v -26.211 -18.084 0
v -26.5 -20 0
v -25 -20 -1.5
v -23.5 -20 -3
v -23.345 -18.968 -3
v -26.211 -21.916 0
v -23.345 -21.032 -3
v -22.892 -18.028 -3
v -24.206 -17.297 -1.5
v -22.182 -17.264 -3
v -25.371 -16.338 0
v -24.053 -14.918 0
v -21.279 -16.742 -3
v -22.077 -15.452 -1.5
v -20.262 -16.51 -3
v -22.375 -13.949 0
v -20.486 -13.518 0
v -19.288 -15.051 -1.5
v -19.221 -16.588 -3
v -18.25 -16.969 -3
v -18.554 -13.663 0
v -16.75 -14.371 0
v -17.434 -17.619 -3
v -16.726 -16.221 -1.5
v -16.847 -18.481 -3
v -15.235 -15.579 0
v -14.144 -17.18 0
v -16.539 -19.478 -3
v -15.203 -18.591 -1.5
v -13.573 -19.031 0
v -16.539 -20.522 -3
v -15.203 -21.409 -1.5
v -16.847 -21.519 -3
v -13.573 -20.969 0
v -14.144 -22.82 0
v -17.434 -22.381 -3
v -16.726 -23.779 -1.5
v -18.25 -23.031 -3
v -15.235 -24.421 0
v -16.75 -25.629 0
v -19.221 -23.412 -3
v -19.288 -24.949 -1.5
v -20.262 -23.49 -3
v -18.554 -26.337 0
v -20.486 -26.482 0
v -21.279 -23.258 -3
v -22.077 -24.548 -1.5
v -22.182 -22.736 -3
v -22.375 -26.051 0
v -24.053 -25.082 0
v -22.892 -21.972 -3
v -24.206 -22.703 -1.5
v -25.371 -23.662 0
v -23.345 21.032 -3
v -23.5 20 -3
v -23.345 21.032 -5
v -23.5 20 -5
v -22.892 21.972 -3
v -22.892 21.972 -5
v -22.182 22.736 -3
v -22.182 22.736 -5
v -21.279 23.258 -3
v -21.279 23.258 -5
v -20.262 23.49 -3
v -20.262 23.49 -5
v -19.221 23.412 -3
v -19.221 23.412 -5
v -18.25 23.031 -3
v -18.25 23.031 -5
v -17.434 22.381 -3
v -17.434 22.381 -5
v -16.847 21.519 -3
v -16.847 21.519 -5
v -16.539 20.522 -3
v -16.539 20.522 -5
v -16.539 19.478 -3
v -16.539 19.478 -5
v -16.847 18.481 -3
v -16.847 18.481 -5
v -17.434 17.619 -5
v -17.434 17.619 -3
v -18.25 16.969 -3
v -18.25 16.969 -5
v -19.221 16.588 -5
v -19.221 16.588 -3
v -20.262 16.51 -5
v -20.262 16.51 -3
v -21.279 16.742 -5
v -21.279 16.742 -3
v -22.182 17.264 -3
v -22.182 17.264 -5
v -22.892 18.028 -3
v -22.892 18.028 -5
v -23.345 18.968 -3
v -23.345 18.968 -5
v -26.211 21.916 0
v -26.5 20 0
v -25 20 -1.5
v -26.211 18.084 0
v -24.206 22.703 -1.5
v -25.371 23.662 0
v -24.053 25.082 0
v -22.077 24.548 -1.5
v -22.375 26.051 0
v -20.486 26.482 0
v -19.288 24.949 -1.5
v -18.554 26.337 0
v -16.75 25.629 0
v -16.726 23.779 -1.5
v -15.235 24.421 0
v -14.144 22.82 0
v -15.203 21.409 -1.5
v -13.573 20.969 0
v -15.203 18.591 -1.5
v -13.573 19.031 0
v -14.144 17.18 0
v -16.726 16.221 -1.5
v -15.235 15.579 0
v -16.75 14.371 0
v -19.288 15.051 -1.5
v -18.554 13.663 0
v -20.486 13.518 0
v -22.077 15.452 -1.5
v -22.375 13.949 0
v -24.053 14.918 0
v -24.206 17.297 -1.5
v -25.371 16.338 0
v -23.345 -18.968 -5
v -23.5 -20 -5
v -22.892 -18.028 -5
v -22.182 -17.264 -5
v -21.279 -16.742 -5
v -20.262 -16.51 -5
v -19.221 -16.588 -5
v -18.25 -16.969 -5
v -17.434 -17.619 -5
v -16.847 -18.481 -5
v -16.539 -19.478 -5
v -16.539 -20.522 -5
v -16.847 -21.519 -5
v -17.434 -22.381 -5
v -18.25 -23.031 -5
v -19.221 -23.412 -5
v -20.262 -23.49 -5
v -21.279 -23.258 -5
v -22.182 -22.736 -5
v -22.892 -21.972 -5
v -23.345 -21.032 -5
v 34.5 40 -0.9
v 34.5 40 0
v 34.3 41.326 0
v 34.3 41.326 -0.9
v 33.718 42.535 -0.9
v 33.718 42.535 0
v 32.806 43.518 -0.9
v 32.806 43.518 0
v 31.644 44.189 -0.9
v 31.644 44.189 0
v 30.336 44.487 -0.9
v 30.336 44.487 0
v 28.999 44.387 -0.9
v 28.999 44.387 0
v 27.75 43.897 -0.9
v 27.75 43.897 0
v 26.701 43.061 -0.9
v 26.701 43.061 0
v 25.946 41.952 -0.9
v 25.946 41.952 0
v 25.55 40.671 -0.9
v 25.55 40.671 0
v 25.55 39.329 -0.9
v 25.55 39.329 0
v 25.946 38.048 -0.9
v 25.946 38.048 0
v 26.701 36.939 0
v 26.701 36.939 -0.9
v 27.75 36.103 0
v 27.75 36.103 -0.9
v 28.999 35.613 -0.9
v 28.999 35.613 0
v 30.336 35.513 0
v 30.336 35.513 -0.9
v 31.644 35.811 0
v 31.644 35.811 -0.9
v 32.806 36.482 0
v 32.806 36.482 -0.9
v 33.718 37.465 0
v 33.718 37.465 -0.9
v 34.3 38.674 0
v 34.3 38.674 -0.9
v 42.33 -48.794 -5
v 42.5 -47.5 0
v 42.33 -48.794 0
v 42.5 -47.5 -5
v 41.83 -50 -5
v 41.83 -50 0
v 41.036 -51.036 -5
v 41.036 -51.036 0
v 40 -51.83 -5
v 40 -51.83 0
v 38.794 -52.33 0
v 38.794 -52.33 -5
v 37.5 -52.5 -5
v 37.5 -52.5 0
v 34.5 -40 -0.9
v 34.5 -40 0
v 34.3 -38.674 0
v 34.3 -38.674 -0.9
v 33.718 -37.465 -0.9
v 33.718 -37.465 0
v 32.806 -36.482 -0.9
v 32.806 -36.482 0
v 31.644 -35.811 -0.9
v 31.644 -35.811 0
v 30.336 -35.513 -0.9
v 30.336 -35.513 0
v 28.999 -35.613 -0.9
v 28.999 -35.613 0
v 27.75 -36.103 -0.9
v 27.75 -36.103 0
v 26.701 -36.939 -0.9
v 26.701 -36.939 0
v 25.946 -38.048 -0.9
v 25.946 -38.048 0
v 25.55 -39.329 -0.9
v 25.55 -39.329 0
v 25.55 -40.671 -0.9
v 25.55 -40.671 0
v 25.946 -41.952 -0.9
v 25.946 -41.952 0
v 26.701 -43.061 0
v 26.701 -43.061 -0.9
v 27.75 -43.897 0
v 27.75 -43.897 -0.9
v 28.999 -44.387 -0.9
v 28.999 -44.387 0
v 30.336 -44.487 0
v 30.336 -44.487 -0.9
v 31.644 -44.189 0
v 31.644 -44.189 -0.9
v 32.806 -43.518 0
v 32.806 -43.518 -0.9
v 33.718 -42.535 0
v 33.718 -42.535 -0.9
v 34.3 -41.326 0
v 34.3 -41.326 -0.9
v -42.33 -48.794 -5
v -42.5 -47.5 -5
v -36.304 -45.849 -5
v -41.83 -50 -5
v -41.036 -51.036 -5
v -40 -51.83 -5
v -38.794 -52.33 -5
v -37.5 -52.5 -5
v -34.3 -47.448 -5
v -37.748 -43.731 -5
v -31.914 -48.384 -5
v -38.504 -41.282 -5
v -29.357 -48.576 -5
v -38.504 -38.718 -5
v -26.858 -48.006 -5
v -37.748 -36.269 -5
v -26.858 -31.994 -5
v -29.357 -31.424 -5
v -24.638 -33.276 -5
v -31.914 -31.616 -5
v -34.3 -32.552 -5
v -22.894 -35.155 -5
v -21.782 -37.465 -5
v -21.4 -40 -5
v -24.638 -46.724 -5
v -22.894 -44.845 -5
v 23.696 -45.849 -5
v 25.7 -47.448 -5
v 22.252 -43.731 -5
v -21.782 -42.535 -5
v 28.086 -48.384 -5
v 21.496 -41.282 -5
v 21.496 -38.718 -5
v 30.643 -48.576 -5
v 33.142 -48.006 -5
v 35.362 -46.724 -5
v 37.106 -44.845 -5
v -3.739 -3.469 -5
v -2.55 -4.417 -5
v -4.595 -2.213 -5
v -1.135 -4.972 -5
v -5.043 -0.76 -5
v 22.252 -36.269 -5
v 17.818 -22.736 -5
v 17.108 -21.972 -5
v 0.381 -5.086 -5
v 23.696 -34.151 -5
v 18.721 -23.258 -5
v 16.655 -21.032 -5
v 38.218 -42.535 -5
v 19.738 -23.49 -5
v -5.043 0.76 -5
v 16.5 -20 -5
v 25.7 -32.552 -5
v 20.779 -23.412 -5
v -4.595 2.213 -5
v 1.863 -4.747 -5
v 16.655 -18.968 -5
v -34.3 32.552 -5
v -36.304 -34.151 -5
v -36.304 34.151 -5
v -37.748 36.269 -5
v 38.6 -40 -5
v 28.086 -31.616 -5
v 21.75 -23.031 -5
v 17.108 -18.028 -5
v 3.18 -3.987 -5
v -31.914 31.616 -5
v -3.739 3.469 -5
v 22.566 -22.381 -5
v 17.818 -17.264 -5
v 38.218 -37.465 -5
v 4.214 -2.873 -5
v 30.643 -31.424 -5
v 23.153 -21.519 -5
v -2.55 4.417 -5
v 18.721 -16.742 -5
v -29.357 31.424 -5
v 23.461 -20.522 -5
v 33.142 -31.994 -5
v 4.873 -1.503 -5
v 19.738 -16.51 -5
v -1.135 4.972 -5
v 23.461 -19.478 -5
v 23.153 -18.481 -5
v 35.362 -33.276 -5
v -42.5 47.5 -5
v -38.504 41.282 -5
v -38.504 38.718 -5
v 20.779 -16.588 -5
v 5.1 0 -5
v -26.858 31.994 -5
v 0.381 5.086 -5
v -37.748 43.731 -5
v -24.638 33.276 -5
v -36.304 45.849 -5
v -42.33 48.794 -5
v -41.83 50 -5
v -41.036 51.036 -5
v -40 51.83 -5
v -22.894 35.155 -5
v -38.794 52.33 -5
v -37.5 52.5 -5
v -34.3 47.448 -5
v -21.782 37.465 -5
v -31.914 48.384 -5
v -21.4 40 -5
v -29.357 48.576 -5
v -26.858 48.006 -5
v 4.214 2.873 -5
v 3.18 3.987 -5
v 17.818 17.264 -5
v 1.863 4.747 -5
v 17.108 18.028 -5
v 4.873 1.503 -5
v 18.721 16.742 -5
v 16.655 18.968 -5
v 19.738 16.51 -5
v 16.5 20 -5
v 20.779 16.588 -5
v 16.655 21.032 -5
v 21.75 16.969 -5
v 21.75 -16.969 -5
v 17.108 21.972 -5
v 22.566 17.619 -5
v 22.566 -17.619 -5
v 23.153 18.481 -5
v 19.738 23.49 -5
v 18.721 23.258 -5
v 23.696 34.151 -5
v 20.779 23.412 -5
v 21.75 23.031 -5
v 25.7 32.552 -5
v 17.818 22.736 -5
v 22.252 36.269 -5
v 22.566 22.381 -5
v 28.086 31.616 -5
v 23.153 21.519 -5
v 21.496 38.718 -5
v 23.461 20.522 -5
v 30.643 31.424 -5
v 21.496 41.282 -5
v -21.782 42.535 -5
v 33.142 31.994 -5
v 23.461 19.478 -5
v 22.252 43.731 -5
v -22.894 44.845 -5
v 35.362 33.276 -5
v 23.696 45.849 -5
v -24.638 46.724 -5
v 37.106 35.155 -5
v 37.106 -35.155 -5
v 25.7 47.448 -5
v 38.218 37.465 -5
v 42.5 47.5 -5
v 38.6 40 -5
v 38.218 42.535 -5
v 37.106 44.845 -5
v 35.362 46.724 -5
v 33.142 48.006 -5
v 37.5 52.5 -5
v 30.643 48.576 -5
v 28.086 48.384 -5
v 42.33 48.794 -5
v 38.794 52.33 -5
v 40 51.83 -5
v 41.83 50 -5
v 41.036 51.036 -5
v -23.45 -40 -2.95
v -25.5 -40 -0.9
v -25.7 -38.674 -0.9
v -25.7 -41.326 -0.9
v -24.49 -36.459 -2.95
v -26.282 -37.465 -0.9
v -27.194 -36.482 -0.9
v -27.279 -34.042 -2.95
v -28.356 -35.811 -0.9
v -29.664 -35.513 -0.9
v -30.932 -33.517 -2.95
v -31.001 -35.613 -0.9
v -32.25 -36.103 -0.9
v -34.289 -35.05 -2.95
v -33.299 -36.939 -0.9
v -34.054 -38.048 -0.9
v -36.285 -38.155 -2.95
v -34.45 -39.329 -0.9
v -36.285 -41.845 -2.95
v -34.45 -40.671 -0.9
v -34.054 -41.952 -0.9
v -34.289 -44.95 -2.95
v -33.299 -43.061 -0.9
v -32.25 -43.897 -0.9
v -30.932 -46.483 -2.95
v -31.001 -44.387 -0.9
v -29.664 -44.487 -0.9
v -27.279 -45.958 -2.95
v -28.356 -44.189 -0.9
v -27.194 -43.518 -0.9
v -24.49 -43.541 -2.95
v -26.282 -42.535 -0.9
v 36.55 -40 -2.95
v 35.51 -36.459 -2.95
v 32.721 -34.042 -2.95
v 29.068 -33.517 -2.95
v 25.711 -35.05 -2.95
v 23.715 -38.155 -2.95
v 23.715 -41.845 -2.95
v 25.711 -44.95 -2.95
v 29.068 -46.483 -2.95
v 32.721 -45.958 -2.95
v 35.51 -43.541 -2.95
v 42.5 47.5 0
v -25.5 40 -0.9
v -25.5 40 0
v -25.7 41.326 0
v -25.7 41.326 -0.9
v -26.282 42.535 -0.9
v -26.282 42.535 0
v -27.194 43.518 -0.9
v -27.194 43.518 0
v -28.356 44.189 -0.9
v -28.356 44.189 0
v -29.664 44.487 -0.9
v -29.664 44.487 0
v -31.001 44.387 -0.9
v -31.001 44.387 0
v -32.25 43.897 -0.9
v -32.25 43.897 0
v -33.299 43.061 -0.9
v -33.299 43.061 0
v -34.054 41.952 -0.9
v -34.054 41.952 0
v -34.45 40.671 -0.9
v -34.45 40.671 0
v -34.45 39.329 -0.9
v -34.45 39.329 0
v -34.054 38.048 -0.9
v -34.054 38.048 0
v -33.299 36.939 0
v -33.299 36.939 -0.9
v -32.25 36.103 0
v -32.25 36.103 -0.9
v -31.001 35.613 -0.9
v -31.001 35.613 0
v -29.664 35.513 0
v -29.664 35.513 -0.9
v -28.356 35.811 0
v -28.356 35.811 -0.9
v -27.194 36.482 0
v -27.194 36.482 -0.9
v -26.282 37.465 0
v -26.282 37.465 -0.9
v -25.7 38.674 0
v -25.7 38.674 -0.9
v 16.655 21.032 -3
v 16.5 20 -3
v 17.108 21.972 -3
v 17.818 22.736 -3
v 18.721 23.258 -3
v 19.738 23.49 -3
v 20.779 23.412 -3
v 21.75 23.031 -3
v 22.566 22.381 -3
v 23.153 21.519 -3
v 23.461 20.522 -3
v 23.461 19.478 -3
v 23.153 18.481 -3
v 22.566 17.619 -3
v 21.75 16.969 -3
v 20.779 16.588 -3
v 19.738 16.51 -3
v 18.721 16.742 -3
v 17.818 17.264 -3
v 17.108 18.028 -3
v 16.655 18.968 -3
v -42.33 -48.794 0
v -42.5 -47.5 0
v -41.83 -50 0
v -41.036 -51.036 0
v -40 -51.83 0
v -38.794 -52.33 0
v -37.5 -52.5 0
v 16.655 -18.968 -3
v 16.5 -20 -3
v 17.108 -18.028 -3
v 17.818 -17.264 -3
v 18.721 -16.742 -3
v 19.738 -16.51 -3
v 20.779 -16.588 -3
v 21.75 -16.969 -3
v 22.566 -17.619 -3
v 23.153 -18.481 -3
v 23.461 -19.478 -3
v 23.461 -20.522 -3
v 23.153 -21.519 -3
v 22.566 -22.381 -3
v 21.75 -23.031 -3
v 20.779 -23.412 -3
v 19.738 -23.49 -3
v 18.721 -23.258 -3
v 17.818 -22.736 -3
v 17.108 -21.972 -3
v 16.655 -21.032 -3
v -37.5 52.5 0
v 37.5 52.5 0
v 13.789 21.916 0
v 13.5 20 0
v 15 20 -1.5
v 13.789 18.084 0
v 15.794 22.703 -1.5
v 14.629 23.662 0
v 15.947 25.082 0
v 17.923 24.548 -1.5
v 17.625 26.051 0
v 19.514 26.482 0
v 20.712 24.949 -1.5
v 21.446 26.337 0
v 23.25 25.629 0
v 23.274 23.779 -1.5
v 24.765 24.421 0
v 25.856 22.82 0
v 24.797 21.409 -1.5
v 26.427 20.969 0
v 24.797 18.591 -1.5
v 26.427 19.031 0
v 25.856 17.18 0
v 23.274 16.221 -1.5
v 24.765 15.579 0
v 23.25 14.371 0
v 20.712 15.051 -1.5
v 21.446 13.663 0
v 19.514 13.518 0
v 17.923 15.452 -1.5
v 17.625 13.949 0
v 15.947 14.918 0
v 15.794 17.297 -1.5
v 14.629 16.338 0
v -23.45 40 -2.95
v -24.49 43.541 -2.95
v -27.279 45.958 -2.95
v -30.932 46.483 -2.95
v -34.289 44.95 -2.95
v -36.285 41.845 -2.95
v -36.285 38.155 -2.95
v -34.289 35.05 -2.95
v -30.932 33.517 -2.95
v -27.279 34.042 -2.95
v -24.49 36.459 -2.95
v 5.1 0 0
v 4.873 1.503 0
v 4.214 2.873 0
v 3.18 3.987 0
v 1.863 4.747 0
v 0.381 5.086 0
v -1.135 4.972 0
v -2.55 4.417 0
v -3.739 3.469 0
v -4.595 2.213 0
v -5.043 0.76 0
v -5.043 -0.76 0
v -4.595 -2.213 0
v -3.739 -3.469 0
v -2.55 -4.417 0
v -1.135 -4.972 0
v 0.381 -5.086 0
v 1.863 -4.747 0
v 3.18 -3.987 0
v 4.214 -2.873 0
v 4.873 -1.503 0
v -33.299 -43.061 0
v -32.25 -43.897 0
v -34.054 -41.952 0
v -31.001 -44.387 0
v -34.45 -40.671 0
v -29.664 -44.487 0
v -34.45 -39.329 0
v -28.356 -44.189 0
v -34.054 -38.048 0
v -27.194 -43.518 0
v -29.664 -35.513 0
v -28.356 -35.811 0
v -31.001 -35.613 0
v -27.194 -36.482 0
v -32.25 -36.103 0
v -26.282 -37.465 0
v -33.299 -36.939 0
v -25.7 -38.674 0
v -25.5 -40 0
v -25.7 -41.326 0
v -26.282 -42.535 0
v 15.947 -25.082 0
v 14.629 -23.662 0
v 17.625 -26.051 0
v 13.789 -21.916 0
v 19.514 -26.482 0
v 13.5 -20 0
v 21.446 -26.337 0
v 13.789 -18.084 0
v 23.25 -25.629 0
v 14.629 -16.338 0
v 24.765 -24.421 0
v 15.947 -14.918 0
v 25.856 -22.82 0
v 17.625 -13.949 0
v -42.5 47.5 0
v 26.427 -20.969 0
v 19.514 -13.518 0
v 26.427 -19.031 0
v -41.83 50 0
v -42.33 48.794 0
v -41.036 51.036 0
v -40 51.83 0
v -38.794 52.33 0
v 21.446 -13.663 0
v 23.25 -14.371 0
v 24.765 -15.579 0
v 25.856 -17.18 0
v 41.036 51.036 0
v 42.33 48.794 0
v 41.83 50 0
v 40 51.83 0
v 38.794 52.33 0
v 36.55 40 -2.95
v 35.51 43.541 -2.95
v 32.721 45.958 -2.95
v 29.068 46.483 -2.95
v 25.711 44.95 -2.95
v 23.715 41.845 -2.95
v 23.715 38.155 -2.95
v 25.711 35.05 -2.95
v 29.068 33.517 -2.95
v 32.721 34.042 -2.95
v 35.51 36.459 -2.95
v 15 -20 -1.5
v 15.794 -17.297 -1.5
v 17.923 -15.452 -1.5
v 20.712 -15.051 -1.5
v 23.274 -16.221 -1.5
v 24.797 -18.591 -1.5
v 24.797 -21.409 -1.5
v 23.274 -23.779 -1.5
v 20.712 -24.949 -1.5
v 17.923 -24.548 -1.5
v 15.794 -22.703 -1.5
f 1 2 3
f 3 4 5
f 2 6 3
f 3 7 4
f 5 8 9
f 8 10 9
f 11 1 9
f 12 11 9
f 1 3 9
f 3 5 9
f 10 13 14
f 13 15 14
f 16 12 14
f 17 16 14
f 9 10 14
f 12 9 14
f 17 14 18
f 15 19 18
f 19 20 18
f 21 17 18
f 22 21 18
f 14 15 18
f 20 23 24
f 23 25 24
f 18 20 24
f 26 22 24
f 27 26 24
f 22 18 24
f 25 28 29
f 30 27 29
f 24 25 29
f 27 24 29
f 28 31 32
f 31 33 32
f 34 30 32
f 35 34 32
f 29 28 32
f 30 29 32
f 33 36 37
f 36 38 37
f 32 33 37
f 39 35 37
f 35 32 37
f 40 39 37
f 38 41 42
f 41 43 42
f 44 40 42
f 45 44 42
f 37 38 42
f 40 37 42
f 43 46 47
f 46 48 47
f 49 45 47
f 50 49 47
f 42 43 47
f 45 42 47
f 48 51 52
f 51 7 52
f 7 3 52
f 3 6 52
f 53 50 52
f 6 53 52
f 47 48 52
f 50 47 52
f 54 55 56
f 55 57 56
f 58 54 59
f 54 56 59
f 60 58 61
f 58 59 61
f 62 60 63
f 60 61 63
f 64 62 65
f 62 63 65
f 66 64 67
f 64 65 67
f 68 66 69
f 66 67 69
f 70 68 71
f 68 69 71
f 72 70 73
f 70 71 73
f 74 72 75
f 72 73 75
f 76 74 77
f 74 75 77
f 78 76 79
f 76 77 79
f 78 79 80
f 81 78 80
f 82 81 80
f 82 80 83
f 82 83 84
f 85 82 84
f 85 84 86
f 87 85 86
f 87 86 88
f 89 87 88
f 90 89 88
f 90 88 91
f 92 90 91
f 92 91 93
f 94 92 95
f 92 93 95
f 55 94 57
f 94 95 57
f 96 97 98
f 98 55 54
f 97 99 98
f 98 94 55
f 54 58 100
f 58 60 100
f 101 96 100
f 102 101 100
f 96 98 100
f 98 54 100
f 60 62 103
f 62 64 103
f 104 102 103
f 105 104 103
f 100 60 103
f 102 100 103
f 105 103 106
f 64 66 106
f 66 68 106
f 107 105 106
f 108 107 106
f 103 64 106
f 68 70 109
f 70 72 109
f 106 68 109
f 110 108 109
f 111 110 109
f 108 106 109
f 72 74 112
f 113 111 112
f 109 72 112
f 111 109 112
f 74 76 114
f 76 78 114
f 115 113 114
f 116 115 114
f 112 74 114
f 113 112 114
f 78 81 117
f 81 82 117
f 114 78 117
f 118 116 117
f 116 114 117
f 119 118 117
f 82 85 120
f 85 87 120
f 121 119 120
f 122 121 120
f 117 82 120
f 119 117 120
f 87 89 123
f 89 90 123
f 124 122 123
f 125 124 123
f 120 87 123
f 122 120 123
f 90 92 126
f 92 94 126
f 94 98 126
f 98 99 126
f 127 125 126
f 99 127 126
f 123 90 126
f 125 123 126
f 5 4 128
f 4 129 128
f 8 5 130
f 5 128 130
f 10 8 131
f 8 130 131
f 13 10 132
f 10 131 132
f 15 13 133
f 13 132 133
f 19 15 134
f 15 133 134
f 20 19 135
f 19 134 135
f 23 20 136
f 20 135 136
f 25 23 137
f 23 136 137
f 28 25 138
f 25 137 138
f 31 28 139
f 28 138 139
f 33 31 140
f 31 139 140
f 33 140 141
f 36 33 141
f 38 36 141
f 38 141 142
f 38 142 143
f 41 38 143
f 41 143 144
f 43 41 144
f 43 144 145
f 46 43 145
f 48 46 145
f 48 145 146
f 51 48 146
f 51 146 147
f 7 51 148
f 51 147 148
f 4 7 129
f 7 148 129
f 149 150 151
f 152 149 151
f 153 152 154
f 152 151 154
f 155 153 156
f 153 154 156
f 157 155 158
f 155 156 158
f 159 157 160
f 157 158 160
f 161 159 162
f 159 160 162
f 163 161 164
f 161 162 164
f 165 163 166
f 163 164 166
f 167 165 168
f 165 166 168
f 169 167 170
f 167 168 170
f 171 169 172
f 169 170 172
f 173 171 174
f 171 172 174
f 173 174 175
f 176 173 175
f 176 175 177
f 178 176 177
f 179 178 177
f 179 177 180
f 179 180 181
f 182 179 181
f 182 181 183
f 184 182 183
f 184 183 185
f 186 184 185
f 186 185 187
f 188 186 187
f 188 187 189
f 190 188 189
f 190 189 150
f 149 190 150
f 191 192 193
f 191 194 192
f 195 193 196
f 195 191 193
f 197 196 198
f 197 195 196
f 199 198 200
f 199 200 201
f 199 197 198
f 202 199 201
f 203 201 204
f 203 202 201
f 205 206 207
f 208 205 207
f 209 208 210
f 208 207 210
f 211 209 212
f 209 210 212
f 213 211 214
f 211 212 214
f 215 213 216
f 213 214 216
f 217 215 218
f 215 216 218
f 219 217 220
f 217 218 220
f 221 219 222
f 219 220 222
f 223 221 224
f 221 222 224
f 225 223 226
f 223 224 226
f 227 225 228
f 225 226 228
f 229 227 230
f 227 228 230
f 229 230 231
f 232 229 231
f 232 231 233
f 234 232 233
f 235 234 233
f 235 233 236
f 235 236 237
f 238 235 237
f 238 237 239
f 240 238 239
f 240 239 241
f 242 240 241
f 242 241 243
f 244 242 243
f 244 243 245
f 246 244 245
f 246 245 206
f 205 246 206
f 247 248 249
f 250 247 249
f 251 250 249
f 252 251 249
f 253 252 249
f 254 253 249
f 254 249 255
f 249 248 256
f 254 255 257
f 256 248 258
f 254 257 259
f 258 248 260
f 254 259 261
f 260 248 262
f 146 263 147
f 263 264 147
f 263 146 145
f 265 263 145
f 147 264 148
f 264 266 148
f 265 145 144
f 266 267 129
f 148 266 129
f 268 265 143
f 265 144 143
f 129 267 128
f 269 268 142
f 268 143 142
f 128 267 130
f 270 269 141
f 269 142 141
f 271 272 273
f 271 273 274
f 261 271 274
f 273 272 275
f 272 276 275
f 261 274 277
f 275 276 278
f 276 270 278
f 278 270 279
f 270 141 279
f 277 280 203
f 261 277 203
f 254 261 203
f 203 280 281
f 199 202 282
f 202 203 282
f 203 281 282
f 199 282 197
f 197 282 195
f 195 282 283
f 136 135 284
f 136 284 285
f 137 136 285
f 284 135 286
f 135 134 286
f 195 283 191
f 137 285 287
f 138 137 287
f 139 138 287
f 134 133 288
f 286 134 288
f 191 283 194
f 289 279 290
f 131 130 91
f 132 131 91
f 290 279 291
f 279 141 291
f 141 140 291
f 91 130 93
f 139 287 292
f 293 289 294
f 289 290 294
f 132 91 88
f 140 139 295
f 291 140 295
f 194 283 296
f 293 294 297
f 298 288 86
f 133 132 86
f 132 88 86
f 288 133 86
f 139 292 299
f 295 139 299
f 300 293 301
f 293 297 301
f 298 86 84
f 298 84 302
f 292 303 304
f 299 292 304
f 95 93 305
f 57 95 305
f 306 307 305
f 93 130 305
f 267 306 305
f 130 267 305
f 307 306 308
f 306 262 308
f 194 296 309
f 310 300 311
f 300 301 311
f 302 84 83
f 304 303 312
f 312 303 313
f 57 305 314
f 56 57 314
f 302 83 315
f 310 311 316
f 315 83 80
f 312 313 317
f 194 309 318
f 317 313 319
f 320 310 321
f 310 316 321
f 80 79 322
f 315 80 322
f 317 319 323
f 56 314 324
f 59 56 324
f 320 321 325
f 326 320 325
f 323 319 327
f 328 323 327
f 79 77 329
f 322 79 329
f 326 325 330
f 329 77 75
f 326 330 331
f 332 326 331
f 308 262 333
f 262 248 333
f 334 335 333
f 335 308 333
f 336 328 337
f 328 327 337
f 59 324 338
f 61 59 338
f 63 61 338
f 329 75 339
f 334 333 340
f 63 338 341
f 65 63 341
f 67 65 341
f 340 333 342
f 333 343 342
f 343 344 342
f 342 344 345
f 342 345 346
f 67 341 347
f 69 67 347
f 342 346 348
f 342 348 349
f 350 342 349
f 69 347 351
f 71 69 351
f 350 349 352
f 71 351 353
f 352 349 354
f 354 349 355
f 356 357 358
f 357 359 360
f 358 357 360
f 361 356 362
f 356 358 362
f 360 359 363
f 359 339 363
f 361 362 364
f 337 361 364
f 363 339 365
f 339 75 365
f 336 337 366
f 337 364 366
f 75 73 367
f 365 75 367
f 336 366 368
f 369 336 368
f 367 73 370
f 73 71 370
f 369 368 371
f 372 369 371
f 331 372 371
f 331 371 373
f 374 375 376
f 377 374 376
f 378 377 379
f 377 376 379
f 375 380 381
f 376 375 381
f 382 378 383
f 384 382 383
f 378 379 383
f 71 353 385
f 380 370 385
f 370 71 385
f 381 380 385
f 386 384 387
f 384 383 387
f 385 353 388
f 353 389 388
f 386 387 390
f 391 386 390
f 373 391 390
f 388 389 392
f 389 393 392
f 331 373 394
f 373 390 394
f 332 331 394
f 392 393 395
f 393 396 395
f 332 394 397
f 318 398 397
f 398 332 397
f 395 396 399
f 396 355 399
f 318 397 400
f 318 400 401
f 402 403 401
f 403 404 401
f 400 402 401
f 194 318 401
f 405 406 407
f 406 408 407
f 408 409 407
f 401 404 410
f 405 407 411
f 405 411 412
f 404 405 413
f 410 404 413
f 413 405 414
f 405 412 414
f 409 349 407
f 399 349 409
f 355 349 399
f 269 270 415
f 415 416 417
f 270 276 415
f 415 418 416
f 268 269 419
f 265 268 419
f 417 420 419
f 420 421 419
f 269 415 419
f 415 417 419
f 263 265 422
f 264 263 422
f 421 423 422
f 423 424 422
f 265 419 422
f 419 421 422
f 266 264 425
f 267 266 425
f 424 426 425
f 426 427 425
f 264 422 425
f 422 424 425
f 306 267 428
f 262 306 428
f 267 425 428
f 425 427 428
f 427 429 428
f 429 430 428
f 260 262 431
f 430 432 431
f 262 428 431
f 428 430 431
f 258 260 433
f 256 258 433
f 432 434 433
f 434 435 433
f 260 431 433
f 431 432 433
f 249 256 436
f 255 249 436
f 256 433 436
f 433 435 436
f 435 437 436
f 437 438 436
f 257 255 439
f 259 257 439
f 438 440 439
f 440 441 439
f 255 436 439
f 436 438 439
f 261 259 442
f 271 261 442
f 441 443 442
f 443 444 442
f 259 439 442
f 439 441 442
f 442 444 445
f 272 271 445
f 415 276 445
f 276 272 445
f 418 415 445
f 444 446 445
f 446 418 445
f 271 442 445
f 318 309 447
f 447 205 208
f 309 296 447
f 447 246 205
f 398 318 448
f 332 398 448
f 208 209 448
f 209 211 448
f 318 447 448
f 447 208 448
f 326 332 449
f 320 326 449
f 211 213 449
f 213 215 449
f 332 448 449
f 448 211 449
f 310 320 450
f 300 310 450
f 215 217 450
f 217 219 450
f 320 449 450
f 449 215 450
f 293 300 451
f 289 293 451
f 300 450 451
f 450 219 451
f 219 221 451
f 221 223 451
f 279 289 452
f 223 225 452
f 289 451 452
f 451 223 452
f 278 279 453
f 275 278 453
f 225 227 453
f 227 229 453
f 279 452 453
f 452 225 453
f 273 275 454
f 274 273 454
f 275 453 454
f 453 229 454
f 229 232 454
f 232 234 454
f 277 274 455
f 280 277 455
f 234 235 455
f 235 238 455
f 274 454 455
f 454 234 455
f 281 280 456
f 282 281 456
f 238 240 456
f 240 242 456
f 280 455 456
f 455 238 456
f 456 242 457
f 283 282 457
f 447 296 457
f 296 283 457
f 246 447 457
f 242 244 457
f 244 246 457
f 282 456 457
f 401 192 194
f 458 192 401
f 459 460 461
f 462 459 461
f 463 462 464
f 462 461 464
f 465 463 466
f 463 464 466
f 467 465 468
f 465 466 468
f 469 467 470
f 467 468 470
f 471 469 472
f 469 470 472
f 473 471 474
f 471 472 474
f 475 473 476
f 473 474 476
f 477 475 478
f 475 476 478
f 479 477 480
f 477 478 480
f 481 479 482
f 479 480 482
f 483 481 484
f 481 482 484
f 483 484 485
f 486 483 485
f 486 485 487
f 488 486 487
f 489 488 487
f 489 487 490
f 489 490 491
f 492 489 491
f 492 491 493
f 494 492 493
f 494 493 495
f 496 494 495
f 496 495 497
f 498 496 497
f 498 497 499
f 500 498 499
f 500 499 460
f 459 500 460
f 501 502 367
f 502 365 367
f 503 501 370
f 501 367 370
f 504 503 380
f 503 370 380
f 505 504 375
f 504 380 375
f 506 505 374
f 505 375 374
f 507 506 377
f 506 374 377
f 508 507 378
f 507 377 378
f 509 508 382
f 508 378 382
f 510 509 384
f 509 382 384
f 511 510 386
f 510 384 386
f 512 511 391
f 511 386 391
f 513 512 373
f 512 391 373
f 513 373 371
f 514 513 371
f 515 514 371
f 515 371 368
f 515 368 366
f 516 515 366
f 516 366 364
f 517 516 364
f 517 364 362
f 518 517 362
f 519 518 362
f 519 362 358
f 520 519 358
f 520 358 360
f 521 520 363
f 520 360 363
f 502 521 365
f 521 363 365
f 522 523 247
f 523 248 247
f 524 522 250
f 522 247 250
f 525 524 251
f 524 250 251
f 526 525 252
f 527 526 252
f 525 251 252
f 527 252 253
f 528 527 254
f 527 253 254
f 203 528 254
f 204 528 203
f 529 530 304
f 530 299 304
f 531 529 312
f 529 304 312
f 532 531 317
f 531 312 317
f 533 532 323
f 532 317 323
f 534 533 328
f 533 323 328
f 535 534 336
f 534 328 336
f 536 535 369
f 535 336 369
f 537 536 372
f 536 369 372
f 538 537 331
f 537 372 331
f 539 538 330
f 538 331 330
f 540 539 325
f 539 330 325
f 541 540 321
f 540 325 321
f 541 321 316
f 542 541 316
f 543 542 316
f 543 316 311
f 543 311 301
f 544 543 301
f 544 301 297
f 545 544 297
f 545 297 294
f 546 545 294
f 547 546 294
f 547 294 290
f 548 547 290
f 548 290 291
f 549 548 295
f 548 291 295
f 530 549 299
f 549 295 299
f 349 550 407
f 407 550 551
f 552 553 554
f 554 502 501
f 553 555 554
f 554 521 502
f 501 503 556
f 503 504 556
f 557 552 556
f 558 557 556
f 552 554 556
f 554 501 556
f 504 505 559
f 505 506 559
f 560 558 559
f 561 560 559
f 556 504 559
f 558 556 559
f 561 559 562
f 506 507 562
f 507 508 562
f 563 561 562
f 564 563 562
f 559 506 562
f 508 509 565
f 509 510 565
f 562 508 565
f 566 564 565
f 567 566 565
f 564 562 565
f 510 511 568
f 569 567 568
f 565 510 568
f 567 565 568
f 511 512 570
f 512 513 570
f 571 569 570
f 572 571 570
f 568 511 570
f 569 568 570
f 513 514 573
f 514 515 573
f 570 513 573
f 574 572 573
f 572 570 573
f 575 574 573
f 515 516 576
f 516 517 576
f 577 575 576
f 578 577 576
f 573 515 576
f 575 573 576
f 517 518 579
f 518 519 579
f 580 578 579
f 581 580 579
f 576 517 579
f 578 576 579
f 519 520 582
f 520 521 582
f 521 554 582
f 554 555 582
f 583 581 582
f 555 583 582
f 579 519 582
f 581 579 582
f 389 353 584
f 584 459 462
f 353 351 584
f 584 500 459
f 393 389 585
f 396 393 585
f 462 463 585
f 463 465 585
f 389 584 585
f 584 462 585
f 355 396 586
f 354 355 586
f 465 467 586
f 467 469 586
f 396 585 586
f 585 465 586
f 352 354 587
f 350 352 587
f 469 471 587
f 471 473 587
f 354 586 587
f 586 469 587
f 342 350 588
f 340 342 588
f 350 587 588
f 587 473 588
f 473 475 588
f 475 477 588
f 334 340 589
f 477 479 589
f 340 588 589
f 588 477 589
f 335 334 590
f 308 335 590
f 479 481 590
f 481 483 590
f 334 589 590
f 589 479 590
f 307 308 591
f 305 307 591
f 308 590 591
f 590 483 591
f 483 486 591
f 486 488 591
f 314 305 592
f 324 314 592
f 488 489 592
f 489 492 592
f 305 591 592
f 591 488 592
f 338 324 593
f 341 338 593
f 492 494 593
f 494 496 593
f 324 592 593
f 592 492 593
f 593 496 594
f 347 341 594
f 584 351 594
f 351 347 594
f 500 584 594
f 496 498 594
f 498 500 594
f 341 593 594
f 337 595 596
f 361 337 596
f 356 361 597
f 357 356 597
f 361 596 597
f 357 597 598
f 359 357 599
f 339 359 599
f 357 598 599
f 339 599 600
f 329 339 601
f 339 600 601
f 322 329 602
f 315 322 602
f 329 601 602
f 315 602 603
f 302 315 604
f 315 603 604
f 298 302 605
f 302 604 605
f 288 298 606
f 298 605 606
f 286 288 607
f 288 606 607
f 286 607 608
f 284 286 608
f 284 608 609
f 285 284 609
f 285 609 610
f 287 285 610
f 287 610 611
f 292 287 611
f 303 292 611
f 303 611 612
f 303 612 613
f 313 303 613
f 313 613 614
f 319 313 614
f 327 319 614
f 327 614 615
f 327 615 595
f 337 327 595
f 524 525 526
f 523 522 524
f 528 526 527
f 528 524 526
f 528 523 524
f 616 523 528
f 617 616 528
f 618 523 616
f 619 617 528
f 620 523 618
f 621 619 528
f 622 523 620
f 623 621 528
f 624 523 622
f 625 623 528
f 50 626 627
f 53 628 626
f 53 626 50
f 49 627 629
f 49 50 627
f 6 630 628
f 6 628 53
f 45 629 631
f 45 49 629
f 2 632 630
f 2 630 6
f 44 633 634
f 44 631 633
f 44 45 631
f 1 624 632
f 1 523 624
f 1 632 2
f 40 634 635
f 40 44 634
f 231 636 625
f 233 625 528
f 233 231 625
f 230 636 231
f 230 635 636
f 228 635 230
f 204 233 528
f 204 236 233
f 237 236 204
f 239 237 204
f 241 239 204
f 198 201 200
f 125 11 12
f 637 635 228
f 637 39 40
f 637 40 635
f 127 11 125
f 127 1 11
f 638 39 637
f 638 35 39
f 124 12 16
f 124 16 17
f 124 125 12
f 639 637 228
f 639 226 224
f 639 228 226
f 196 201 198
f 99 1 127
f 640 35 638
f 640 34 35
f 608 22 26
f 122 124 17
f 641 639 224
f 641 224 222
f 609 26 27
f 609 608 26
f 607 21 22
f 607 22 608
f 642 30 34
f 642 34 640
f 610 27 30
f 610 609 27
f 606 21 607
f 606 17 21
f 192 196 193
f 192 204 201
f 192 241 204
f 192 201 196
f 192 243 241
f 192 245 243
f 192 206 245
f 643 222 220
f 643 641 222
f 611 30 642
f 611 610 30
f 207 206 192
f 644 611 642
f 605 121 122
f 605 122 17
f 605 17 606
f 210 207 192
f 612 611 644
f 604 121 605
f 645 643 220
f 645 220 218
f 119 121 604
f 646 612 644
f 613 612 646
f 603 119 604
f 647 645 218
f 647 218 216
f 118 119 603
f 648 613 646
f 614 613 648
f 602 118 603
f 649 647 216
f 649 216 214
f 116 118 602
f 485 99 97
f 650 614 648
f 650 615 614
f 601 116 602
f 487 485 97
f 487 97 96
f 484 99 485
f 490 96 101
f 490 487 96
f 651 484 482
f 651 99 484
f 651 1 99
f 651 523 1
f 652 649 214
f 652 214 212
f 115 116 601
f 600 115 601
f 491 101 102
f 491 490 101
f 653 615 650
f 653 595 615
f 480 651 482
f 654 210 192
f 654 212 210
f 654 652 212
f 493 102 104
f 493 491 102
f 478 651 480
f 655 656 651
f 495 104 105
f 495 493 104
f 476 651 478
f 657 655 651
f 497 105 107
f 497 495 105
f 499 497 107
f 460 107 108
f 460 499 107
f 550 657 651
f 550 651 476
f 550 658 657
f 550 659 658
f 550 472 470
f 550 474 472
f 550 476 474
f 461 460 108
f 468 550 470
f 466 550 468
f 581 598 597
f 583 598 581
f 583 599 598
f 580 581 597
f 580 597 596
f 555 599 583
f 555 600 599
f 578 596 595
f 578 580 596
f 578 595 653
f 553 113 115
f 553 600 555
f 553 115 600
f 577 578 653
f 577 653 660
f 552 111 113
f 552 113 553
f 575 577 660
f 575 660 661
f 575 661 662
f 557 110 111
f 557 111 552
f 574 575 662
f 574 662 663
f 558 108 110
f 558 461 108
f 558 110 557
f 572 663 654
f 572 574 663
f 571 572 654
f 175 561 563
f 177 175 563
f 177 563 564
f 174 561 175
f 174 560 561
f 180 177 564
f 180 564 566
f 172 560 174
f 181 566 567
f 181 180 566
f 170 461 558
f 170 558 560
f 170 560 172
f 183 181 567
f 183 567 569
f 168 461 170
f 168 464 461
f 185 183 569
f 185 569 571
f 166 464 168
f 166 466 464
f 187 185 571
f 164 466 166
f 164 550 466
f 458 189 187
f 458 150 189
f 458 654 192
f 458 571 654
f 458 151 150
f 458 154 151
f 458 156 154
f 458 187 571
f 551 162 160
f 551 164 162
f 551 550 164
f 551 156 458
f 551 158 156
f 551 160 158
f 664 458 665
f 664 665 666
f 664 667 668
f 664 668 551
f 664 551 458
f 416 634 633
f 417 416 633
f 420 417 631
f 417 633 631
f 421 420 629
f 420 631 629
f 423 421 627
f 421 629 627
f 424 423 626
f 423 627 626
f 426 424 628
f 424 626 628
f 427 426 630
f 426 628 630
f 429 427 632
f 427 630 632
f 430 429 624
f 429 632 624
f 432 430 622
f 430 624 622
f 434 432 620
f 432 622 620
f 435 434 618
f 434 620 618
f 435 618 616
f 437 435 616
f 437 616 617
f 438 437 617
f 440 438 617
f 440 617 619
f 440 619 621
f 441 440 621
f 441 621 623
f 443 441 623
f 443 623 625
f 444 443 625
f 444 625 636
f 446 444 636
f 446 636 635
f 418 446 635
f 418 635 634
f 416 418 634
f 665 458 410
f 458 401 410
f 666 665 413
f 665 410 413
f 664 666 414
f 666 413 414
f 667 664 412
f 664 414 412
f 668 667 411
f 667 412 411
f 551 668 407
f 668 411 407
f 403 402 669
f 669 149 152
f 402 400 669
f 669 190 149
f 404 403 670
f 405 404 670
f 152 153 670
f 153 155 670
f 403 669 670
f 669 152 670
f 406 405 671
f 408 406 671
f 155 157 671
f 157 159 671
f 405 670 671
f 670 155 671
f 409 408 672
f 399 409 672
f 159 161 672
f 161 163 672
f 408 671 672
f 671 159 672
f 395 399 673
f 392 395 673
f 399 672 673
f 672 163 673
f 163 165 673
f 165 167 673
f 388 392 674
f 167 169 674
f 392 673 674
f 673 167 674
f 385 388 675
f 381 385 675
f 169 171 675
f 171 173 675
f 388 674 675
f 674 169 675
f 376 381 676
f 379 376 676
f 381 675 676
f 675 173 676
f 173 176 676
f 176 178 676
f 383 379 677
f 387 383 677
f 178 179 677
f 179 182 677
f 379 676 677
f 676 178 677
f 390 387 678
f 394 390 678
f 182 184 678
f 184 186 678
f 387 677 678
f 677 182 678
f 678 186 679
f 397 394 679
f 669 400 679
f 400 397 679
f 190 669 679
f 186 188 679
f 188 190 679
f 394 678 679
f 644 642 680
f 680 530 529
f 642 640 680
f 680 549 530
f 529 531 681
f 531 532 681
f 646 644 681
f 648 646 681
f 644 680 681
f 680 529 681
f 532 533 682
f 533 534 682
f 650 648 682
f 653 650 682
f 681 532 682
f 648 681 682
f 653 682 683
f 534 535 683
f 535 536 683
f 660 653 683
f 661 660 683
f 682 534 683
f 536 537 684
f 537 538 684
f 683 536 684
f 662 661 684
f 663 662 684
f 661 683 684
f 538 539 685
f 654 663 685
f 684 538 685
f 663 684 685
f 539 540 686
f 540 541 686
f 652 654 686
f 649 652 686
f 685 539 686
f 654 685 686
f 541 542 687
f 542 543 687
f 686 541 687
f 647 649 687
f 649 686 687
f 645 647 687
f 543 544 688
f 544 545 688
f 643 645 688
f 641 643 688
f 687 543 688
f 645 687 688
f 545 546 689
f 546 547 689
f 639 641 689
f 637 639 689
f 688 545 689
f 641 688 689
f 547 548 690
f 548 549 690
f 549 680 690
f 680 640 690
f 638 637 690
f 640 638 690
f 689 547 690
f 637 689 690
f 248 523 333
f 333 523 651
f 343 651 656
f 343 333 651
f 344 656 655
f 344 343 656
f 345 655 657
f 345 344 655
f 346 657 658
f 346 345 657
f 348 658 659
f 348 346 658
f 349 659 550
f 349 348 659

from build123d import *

# Parameters (mm, degrees)
F0_W           = 85
F0_H           = 105
F1_DEPTH       = 5
F2_R           = 5.1
F2_R_2         = 4.5
F3_DEPTH       = 5.001
F5_D           = 7
F5_CSINK_D     = 13
F5_CSINK_ANGLE = 90
F6_R           = 5
F7_SIZE        = 4.1


with BuildPart() as f1:
    # F0 (on Top) → F1 (new body)
    with BuildSketch(Plane.XY):
        Rectangle(F0_W, F0_H)
    extrude(amount=-F1_DEPTH)

    # F2 (on face) → F3 (cut, through all)
    with BuildSketch(Plane.XY):
        Circle(F2_R)
        with Locations((30, 40)):
            Circle(F2_R_2)
        with Locations((-30, 40)):
            Circle(F2_R_2)
        with Locations((-30, -40)):
            Circle(F2_R_2)
        with Locations((30, -40)):
            Circle(F2_R_2)
    extrude(amount=-F3_DEPTH, mode=Mode.SUBTRACT)

    # F5 (through all)
    with Locations(Plane.XY):
        with Locations((-20, 20), (20, 20), (20, -20), (-20, -20)):
            CounterSinkHole(F5_D / 2, F5_CSINK_D / 2, counter_sink_angle=F5_CSINK_ANGLE)

    # F6
    f6_edges = [f1.edges().sort_by_distance(p)[0] for p in [
        (-42.5, -52.5, -2.5),
        (42.5, -52.5, -2.5),
        (42.5, 52.5, -2.5),
        (-42.5, 52.5, -2.5),
    ]]
    fillet(f6_edges, radius=F6_R)

    # F7
    f7_edges = [f1.edges().sort_by_distance(p)[0] for p in [
        (25.5, 40, -5),
        (-34.5, 40, -5),
        (-34.5, -40, -5),
        (25.5, -40, -5),
    ]]
    chamfer(f7_edges, length=F7_SIZE)


solid = f1.part
